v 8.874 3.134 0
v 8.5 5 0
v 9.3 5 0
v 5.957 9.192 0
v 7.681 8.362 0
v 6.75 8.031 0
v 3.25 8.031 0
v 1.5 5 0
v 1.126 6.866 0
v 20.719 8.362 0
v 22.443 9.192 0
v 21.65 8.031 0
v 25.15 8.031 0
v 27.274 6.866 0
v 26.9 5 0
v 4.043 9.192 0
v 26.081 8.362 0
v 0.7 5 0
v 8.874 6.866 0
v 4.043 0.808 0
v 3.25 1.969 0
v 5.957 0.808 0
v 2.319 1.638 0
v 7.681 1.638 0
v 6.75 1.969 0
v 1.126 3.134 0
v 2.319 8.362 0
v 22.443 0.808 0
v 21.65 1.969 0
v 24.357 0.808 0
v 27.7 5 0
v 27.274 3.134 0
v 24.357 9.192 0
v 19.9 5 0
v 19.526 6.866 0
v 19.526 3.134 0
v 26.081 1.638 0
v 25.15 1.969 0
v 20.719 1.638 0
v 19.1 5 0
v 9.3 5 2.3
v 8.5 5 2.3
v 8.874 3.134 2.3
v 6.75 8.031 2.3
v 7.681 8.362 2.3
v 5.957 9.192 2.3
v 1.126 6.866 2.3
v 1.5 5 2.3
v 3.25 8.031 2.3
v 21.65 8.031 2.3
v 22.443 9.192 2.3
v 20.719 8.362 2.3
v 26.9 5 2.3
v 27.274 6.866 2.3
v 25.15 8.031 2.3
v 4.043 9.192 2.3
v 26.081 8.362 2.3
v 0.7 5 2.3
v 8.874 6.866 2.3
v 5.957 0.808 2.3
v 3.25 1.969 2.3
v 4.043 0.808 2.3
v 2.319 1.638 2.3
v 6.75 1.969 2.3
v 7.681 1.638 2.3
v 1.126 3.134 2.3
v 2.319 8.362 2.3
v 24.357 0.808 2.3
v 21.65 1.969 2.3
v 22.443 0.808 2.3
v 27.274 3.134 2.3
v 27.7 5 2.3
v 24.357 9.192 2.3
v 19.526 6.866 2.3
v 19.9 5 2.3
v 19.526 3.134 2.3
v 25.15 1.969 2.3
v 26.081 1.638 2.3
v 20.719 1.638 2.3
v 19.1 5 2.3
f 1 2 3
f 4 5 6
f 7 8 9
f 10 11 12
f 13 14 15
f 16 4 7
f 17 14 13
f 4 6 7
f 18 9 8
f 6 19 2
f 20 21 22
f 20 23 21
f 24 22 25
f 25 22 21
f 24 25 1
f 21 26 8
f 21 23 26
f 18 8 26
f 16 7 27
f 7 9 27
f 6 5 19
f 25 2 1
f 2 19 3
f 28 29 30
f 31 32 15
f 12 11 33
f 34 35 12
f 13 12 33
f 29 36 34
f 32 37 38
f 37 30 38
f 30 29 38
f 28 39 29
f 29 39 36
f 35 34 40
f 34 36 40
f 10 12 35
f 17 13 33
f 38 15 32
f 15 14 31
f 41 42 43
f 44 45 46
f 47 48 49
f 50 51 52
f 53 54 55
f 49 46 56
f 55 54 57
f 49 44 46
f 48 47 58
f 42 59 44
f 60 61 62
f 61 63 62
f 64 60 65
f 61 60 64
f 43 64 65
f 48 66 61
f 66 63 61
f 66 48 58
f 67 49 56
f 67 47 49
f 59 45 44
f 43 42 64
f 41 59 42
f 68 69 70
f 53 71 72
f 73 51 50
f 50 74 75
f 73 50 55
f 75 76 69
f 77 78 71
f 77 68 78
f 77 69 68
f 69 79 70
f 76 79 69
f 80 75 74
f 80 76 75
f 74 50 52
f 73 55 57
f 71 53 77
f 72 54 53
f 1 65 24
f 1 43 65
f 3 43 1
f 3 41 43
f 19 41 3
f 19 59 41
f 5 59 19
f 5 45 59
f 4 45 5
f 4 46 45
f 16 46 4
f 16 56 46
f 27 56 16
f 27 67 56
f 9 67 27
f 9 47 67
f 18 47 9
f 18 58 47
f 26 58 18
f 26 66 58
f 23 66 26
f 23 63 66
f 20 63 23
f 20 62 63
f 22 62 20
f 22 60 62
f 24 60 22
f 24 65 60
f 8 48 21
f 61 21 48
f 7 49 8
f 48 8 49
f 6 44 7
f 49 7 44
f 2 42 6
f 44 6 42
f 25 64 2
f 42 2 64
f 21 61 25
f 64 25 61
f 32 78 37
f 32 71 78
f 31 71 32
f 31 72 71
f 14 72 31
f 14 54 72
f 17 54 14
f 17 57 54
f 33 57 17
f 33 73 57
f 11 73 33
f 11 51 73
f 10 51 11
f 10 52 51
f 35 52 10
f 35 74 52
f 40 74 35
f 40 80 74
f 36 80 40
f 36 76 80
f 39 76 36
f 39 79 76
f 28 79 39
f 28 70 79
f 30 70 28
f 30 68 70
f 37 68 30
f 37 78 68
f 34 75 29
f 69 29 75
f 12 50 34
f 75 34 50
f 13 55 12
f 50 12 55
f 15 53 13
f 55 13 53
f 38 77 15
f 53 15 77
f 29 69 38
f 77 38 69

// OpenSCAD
// Copyright (C) 2025 Arif K. Rafiq
// This program is free software: you can redistribute it and/or modify
// it under the terms of the GNU General Public License as published by
// the Free Software Foundation, either version 3 of the License, or
// (at your option) any later version.

// This program is distributed in the hope that it will be useful,
// but WITHOUT ANY WARRANTY; without even the implied warranty of
// MERCHANTABILITY or FITNESS FOR A PARTICULAR PURPOSE.  See the
// GNU General Public License for more details.

// You should have received a copy of the GNU General Public License
// along with this file.  If not, see <https://www.gnu.org/licenses/>,
// or write to: license@temperedoptimism.com


// NOTHING SHOWS
// Fixed in example3.scad

tWallMin = 0.40;         // Limit for 3D printer, I have 0.2
pHexSink = [3.5, 2.3];
vTerminal0 = [5.0, 5.0];
vTerminal1 = [23.4, 5.0];

// hex pocket
// The union is subtracted.
linear_extrude(pHexSink.y){
    difference(){
        union(){
          translate(vTerminal0)  circle(pHexSink.x +(tWallMin *2));
          translate(vTerminal1)  circle(pHexSink.x +(tWallMin *2));
        }
      translate(vTerminal0)  circle(pHexSink.x, $fn=6);
      translate(vTerminal1)  circle(pHexSink.x, $fn=6);
    }
}
